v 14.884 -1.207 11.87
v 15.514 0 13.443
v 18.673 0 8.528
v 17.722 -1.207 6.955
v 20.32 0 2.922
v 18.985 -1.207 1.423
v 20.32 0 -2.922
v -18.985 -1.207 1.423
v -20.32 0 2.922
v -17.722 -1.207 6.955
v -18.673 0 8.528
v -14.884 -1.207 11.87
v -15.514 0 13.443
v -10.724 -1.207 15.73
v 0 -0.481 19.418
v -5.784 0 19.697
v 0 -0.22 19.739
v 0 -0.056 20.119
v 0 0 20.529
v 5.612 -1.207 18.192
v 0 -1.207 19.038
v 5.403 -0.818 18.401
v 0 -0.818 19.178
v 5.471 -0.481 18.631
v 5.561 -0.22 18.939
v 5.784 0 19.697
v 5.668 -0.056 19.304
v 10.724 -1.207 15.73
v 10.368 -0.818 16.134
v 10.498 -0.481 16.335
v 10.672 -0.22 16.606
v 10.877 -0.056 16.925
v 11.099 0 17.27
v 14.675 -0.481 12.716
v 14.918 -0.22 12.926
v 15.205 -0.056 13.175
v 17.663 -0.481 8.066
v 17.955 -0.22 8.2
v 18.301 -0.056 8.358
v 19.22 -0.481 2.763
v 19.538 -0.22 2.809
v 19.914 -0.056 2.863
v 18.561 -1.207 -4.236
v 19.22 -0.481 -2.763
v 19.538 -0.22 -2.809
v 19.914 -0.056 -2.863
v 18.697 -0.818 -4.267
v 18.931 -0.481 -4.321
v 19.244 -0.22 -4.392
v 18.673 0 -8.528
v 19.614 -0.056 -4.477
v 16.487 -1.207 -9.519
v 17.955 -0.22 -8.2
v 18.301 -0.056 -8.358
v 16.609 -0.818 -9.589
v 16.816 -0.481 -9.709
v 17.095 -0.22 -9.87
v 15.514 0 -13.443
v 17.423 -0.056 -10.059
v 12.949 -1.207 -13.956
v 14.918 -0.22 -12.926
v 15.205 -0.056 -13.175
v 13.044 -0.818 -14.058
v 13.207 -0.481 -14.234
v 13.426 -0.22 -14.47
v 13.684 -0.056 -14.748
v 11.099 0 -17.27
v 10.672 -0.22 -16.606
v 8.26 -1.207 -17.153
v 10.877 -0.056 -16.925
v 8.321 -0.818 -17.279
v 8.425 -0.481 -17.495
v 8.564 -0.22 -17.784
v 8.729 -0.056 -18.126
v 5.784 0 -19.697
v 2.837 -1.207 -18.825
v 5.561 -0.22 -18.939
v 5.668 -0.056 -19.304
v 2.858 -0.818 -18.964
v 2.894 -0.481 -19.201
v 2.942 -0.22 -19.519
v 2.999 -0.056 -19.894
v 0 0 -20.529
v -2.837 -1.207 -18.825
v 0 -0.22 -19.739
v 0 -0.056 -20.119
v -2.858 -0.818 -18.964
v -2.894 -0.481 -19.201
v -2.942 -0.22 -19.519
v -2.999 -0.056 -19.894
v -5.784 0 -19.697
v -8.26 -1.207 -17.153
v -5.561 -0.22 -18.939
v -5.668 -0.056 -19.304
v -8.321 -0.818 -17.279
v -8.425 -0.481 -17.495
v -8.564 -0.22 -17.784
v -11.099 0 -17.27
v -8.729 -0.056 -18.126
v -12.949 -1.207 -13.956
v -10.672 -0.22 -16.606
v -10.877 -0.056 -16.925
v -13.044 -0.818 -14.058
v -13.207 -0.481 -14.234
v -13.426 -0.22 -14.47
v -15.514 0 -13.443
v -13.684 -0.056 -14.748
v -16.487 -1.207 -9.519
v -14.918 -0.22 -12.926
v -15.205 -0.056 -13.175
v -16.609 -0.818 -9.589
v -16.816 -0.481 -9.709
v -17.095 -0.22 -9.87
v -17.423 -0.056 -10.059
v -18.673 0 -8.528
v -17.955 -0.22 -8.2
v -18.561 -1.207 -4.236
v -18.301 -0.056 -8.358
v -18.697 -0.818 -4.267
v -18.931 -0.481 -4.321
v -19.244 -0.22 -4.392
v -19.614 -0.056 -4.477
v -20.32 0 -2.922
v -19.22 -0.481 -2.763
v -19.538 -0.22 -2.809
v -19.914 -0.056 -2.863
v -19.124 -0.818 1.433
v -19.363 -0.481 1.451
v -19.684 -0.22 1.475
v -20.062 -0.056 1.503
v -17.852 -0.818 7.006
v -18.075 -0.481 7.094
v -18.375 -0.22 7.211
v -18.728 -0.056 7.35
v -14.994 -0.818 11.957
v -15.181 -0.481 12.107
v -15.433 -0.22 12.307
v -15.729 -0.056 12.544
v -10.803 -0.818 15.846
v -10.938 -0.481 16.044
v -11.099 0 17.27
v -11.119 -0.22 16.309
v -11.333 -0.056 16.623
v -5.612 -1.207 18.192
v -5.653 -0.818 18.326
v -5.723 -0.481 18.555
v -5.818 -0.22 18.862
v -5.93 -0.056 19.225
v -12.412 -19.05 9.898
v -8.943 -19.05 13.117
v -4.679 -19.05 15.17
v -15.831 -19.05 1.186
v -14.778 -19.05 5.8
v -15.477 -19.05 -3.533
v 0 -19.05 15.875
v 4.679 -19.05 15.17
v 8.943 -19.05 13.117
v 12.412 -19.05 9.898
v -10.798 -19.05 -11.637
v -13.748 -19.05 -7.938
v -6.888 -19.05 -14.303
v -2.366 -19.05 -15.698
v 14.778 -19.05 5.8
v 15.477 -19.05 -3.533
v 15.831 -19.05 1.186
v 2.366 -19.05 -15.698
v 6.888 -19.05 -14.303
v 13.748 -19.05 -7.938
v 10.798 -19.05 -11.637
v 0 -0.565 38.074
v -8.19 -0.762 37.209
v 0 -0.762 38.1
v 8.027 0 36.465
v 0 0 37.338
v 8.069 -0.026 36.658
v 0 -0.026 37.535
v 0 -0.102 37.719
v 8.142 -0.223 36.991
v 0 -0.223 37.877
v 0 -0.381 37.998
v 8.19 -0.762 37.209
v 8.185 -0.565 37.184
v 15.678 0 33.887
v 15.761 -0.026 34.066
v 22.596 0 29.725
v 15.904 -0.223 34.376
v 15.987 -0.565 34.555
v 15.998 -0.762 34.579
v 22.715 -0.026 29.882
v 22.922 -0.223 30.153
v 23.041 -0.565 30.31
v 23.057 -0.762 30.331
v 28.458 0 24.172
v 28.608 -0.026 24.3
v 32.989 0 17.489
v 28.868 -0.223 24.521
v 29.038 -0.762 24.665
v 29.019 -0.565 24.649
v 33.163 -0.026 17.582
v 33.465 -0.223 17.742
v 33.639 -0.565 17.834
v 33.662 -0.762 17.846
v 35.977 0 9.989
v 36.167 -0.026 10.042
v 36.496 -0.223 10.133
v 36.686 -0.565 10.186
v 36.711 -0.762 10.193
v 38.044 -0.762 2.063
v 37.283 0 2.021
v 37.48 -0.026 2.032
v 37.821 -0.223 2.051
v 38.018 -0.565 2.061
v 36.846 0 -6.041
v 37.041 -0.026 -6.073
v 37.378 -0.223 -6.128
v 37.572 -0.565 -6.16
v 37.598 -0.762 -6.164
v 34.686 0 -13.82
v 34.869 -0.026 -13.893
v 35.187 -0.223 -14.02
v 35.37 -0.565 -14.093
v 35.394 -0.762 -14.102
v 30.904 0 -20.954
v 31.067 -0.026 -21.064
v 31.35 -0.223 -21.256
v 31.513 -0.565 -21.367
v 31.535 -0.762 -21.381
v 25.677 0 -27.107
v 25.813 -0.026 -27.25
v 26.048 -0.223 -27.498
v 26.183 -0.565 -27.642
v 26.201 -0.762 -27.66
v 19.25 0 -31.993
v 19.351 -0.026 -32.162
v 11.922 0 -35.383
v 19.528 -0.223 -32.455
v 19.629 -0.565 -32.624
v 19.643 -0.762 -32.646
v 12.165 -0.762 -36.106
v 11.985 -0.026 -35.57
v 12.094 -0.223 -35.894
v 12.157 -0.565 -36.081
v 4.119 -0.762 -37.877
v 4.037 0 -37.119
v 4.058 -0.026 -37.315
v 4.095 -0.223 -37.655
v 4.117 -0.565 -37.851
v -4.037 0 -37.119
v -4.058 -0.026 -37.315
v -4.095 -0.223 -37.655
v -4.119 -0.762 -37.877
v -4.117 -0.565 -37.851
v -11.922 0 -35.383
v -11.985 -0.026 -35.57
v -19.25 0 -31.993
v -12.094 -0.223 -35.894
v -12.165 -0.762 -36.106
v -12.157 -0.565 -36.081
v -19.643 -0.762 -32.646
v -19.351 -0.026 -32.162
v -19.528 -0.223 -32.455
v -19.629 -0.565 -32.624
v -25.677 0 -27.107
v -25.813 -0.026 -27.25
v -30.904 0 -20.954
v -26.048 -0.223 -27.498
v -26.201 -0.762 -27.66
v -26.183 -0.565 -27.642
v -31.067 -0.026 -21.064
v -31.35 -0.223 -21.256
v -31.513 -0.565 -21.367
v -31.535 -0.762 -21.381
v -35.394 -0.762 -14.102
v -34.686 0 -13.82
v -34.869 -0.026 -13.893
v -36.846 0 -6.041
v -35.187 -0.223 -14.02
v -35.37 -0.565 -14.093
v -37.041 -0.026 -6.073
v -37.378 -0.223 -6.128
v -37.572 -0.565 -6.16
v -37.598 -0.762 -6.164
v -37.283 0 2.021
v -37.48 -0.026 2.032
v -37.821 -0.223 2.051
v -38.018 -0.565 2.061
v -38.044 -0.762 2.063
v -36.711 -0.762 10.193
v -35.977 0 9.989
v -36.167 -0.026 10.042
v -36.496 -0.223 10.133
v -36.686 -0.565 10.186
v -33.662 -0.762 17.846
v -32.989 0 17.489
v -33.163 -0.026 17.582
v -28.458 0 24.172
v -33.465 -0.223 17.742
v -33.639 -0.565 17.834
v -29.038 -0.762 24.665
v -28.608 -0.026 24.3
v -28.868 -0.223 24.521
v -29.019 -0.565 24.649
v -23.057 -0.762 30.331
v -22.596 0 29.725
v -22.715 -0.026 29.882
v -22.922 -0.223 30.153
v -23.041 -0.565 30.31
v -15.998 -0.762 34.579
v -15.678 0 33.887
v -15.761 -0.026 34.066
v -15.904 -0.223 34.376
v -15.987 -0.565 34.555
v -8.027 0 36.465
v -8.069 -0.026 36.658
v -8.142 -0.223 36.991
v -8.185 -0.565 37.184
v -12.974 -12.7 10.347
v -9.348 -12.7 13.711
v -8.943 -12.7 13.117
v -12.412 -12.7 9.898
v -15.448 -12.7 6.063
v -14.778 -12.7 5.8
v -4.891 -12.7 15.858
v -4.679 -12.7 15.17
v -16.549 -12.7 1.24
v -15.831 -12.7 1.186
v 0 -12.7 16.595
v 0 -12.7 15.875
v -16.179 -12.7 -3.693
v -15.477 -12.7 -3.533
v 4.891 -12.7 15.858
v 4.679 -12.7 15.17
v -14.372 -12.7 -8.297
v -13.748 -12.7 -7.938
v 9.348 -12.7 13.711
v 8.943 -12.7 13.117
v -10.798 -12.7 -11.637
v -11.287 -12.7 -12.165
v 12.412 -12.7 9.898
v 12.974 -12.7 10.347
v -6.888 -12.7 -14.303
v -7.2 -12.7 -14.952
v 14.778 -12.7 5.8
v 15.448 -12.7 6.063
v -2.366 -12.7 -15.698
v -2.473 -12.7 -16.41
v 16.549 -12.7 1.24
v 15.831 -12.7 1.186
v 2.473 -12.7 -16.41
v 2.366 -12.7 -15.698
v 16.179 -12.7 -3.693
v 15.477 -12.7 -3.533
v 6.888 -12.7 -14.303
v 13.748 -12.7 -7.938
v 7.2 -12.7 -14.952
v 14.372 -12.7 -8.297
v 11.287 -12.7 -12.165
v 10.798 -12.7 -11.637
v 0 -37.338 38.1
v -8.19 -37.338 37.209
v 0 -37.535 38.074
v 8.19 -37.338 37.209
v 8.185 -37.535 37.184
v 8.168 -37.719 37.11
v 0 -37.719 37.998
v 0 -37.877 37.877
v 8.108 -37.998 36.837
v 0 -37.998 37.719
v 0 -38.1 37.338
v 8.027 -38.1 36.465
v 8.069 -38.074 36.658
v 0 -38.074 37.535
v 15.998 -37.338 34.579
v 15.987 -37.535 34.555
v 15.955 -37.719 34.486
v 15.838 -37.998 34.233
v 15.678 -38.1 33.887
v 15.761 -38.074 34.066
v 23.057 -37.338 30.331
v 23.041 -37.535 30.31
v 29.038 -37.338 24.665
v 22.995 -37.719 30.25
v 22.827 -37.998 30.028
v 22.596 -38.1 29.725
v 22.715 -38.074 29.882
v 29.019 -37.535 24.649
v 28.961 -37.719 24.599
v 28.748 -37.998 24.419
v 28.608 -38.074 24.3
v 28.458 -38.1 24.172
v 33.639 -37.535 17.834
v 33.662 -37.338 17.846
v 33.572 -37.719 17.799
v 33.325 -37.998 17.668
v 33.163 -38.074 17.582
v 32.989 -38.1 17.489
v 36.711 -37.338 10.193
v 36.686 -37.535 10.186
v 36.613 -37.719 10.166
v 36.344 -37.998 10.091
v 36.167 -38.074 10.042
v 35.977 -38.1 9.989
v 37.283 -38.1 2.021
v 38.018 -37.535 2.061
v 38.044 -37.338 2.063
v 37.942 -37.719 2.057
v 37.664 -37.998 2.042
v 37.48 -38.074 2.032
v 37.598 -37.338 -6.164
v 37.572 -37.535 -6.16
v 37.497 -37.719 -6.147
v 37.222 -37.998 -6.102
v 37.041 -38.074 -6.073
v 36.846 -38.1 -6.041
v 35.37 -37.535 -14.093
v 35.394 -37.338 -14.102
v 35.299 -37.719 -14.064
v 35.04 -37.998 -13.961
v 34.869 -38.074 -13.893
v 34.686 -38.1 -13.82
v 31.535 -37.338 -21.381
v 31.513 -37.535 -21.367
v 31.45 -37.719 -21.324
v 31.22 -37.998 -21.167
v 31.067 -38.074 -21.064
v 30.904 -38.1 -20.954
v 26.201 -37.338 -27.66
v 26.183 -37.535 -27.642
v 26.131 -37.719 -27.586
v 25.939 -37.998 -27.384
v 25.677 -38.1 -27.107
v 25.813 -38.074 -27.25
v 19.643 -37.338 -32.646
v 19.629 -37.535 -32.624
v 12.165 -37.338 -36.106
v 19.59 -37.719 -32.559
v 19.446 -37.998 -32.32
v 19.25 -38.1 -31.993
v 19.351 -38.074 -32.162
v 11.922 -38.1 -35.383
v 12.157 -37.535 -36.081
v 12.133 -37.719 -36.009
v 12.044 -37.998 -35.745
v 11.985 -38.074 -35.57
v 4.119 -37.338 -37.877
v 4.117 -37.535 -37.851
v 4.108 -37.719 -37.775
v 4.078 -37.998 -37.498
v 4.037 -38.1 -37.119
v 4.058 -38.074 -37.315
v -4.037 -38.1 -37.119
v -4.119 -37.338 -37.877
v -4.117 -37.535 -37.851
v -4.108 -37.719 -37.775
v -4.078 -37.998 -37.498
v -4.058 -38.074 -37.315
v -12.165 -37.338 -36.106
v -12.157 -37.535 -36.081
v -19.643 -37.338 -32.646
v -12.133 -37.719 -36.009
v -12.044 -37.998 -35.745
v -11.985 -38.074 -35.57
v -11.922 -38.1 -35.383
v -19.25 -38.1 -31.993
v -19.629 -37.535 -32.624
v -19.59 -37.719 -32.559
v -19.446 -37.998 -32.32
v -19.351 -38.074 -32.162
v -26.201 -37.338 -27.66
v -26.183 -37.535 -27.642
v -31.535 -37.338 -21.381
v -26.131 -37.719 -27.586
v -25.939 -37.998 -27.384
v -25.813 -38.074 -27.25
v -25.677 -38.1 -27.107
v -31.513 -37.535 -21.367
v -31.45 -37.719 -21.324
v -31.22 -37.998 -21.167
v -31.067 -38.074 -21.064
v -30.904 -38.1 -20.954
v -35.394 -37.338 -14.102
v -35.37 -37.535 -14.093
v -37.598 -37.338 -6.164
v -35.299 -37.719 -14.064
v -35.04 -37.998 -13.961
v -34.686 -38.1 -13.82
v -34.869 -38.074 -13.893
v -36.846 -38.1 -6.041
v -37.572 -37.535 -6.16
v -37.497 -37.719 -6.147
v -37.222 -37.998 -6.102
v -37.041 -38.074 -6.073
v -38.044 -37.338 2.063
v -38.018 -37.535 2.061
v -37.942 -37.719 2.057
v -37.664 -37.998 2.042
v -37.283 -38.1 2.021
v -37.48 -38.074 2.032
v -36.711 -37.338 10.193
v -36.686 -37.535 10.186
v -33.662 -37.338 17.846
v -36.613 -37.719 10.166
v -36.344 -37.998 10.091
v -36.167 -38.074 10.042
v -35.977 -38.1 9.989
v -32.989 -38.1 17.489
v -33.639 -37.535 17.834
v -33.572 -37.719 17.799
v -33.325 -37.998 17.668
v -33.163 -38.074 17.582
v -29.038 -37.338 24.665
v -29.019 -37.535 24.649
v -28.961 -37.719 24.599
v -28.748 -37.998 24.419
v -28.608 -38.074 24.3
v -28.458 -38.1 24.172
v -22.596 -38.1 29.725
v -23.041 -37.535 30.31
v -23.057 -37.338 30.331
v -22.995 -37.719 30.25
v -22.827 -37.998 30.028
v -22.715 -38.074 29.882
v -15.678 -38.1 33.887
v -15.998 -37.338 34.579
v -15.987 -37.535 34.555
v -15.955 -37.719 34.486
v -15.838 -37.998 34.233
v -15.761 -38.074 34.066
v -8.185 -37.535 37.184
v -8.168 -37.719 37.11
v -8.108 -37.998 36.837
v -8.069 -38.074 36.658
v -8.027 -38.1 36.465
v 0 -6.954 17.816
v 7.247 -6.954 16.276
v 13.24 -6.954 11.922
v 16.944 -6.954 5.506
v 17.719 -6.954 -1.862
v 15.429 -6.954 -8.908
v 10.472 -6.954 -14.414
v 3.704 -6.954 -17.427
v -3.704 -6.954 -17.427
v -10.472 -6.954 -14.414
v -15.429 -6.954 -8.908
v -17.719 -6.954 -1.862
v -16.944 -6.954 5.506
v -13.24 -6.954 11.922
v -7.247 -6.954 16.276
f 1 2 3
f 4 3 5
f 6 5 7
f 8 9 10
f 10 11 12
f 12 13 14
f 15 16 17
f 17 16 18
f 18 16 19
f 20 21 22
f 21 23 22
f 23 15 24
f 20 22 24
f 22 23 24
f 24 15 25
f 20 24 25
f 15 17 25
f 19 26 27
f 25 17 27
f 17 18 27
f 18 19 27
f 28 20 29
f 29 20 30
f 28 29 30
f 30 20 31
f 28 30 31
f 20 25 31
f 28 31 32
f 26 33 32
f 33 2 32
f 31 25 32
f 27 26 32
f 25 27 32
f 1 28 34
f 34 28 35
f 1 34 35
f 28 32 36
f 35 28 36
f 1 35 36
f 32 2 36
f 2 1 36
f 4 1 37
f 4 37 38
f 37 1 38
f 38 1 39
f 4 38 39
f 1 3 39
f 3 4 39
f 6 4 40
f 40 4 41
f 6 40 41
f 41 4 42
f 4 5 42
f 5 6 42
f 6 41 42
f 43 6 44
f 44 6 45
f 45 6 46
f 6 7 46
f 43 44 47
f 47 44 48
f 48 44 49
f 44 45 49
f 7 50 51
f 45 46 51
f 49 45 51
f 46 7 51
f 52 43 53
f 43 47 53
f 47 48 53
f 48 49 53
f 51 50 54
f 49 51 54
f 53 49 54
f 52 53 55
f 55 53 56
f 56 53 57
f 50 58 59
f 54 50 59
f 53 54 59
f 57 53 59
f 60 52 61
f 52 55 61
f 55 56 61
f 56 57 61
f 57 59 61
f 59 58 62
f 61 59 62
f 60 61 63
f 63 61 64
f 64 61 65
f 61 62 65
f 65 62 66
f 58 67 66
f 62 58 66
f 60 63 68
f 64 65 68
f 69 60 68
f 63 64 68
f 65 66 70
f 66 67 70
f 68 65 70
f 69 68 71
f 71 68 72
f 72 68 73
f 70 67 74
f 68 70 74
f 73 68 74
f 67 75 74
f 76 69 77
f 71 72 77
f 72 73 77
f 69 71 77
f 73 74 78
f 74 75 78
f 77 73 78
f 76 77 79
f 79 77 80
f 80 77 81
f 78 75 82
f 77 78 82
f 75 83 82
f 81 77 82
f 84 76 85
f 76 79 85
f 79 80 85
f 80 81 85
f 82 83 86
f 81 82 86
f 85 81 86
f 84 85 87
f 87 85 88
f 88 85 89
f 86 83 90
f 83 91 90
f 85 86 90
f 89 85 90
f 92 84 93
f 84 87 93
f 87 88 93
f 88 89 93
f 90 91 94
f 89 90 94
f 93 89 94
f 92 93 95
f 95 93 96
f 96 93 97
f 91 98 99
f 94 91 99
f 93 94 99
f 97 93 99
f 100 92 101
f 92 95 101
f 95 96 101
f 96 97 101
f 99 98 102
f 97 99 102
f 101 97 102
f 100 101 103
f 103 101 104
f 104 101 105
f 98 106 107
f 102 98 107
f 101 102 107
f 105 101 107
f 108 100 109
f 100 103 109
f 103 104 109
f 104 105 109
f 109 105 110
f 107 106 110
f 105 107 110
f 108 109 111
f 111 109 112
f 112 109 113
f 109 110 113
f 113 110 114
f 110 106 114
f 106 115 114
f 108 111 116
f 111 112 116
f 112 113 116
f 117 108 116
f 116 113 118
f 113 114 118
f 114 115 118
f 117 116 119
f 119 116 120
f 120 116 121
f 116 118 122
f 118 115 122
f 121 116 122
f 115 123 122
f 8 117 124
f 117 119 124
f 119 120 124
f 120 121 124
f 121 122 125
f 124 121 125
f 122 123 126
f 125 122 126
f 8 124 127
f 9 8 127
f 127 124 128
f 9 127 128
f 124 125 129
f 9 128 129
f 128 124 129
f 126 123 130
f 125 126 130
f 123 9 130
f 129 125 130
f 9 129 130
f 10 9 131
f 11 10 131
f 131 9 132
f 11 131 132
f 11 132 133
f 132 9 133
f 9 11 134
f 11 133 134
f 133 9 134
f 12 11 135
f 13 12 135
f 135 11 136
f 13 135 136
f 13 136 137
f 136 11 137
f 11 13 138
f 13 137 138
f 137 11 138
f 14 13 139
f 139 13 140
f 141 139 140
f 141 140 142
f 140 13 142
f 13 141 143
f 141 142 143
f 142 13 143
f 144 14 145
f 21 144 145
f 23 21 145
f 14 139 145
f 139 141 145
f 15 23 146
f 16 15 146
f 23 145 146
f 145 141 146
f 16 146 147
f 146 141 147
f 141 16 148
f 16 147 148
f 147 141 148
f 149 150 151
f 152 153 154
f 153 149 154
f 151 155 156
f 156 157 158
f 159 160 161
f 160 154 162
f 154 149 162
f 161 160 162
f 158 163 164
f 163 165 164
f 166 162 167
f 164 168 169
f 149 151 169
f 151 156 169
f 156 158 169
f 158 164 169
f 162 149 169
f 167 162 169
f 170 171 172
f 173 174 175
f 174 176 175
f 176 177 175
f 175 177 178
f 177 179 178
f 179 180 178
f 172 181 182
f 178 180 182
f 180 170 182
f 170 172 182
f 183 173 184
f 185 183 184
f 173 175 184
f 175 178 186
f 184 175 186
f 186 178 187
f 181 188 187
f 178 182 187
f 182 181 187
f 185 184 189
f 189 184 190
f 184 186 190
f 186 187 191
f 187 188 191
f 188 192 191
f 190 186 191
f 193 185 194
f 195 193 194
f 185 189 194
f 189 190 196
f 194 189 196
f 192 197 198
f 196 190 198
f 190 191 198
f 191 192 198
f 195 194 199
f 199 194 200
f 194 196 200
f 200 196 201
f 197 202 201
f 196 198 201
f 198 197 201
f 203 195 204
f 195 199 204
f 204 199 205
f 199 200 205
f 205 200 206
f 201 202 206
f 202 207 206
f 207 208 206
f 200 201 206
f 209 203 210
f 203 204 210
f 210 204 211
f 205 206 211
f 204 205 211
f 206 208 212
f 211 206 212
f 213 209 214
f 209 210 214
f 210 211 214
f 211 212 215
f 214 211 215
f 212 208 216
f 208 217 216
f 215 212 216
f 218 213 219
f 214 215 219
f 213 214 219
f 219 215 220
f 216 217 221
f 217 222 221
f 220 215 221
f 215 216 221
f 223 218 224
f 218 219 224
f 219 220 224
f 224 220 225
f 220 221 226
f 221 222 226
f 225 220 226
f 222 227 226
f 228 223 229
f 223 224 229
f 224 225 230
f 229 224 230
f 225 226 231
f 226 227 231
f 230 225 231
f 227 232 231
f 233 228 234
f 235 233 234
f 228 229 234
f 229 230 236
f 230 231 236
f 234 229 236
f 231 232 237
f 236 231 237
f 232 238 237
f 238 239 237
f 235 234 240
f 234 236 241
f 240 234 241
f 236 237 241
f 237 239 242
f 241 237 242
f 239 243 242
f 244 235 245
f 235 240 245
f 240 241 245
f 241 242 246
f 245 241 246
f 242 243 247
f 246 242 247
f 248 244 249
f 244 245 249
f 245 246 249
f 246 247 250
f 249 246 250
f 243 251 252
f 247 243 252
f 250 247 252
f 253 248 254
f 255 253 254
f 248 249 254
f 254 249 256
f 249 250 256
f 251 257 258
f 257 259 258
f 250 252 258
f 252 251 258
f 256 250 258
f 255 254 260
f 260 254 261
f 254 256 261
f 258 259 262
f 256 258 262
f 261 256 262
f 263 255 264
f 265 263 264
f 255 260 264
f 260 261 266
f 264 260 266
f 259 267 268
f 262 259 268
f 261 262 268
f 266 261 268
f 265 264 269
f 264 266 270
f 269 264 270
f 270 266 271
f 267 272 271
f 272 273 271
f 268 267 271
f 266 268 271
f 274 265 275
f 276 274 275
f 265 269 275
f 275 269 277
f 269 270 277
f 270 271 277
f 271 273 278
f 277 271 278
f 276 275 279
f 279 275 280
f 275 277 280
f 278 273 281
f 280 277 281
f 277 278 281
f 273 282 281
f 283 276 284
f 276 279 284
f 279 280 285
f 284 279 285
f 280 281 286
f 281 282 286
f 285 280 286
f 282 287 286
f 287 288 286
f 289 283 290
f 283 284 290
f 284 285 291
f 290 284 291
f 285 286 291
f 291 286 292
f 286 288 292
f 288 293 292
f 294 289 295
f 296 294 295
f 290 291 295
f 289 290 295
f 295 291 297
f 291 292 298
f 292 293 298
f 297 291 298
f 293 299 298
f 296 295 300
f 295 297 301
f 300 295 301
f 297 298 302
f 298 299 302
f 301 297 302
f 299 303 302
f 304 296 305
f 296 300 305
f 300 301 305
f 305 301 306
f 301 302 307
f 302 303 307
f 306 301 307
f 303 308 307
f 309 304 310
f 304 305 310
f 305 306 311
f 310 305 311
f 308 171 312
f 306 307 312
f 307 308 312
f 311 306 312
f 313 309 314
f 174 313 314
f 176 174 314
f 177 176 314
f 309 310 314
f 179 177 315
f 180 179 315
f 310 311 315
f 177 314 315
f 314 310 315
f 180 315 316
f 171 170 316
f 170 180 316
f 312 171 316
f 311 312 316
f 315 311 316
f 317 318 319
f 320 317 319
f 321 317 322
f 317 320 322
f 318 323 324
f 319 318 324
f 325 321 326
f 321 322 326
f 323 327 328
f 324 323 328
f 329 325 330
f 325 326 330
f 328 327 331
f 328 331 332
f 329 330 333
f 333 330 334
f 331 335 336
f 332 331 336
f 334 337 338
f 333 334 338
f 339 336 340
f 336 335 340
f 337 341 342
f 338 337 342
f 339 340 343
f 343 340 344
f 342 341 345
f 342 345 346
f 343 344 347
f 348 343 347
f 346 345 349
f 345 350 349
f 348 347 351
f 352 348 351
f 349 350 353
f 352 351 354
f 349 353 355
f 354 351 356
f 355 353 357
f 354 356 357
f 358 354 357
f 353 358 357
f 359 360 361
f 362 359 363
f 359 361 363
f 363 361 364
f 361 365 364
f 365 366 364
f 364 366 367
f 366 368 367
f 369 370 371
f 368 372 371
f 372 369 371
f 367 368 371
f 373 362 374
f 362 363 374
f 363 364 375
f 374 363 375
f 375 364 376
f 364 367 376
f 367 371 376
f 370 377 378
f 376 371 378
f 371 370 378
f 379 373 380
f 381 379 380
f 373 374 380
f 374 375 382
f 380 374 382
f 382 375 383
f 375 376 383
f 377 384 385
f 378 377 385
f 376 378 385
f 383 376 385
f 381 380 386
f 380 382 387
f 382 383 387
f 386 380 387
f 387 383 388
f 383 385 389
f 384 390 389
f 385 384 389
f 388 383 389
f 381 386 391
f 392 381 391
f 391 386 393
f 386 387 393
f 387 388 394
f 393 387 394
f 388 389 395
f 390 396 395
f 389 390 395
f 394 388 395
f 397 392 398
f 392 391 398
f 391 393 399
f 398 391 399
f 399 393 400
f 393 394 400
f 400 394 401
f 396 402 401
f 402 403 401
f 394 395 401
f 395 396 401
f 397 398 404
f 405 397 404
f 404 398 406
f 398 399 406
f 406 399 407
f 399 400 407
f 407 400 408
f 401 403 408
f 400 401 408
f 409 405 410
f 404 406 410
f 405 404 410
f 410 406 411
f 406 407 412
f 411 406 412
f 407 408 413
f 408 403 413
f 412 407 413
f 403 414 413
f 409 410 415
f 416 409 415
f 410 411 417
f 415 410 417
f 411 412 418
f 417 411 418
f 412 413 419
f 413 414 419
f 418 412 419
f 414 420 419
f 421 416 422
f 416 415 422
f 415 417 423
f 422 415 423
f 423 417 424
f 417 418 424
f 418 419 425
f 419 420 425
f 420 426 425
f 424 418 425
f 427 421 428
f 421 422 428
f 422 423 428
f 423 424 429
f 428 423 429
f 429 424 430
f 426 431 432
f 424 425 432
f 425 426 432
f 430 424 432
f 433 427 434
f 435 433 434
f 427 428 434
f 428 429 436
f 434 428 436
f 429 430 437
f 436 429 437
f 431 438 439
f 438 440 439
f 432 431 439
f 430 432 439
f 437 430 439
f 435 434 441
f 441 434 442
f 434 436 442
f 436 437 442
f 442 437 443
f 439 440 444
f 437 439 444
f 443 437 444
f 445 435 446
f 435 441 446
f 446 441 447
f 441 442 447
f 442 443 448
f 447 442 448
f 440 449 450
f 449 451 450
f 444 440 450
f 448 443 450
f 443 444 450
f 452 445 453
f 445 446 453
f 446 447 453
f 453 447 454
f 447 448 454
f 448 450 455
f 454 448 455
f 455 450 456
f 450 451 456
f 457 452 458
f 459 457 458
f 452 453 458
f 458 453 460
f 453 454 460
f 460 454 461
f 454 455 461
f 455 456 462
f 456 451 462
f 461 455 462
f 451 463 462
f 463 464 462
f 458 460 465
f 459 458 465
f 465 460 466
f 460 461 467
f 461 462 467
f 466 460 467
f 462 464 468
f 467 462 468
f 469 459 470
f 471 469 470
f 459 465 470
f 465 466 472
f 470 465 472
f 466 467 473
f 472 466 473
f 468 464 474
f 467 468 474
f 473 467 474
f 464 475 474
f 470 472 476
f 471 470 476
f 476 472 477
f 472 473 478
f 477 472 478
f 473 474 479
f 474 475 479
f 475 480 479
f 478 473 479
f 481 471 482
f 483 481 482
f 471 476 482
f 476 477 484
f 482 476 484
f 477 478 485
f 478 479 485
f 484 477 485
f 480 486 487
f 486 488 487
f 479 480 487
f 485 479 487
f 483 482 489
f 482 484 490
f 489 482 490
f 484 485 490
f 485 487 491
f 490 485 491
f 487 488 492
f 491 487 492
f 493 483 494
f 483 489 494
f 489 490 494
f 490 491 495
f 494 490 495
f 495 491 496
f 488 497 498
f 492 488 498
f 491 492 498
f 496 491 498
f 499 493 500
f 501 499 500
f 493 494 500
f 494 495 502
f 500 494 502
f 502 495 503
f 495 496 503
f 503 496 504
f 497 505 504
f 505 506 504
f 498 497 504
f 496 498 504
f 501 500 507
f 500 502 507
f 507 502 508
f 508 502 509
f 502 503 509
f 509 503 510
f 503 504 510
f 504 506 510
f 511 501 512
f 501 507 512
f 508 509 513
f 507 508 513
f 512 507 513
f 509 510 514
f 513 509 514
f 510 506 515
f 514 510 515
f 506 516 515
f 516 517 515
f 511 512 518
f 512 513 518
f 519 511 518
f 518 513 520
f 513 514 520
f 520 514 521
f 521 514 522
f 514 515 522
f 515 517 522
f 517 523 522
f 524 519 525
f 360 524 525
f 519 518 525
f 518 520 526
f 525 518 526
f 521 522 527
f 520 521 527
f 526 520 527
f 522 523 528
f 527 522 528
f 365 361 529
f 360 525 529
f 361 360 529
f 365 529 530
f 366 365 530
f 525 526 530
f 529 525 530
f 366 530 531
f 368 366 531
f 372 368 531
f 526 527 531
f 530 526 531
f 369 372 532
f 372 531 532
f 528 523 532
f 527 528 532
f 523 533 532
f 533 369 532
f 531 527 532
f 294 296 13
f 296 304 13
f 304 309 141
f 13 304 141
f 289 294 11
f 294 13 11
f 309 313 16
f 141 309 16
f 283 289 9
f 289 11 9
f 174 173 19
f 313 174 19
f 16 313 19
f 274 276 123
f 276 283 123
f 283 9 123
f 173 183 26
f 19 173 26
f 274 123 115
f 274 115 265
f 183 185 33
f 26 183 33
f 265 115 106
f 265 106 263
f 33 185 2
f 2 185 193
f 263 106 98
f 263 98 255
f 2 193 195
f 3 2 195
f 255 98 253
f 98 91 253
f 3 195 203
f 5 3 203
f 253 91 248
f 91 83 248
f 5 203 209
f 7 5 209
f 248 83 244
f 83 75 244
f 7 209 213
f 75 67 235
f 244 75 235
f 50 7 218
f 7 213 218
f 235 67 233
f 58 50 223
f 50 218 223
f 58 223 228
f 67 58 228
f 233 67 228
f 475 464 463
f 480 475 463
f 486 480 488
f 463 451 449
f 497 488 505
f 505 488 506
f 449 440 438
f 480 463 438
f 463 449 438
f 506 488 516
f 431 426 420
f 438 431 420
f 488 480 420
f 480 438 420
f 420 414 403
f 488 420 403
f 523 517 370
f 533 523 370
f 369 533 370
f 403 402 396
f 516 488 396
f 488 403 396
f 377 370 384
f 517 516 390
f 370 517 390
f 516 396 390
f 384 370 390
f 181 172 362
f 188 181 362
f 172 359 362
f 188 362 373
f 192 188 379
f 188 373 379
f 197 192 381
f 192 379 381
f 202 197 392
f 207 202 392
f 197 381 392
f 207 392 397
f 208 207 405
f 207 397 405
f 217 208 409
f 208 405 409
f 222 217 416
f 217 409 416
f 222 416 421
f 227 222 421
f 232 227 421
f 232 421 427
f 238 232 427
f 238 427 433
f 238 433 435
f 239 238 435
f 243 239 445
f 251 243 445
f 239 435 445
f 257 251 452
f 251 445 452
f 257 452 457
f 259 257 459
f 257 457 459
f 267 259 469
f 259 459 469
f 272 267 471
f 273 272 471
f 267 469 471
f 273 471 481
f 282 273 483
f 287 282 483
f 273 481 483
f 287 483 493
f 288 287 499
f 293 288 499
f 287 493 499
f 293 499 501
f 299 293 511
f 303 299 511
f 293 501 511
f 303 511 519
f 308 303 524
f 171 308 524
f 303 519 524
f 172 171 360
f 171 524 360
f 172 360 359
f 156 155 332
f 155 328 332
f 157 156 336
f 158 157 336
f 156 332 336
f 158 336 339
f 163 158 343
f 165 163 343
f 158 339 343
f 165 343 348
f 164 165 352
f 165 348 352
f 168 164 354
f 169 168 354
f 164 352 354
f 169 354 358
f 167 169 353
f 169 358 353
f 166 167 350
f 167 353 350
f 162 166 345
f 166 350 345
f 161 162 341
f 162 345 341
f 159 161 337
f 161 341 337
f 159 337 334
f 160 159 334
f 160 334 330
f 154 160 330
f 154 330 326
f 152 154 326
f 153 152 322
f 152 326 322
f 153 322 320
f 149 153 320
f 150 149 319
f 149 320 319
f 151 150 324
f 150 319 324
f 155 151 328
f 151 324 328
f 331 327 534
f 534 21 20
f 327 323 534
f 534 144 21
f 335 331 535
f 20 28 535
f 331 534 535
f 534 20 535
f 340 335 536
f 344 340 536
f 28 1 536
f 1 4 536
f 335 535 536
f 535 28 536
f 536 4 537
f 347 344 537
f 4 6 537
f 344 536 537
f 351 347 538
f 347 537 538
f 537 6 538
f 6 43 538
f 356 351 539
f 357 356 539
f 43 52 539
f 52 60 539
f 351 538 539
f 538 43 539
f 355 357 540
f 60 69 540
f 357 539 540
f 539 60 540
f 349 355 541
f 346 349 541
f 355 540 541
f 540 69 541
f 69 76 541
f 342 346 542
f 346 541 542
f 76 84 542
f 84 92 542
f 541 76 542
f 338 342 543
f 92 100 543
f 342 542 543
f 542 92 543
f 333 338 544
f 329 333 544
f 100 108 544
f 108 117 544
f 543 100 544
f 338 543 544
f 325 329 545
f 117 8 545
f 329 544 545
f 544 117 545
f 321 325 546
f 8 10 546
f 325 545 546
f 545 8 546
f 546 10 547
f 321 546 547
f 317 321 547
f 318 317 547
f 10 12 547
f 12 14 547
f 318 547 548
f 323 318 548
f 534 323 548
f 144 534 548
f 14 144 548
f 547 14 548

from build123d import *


with BuildPart() as f1:
    # F0 (on Right) → F1 (revolve)
    with BuildSketch(Plane.YZ):
        with BuildLine():
            Line((-12.7, 15.875), (-12.7, 16.594964))
            Line((-12.7, 16.594964), (-1.207143, 19.037846))
            ThreePointArc((-1.207143, 19.037846), (-0.33963, 19.569458), (0, 20.528543))
            Line((0, 20.528543), (0, 37.338))
            ThreePointArc((0, 37.338), (-0.223185, 37.876815), (-0.762, 38.1))
            Line((-0.762, 38.1), (-37.338, 38.1))
            ThreePointArc((-37.338, 38.1), (-37.876815, 37.876815), (-38.1, 37.338))
            Line((-38.1, 37.338), (-38.1, 0))
            Line((-38.1, 0), (-19.05, 0))
            Line((-19.05, 0), (-19.05, 15.875))
            Line((-19.05, 15.875), (-12.7, 15.875))
        make_face()
    revolve(axis=Axis((0, -28.575, 0), (0, 1, 0)))


solid = f1.part
